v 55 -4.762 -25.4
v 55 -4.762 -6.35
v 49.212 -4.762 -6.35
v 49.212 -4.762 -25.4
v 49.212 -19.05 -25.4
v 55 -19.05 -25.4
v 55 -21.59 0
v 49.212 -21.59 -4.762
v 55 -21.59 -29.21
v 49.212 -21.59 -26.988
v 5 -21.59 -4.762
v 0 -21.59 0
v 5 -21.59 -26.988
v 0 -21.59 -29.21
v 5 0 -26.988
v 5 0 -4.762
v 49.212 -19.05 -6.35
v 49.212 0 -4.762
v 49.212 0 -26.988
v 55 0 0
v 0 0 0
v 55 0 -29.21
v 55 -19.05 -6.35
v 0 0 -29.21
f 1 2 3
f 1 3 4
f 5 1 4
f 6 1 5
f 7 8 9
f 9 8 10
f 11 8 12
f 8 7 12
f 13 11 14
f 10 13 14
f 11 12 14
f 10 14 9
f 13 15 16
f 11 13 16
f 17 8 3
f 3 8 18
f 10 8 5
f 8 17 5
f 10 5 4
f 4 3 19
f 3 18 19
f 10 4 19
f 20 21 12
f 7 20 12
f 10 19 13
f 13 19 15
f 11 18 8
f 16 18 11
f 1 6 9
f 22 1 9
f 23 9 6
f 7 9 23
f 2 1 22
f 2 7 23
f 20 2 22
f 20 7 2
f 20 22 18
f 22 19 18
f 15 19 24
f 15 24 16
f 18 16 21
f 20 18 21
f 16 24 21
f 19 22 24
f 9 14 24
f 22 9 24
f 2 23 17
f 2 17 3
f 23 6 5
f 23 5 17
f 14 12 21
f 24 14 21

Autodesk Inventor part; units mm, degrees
ref_plane "YZ Plane" through (0, 0, 0) normal (1, 0, 0) x (0, 1, 0)
ref_plane "XZ Plane" through (0, 0, 0) normal (0, 1, 0) x (-1, 0, 0)
ref_plane "XY Plane" through (0, 0, 0) normal (0, 0, 1) x (1, 0, 0)
sketch "Sketch1" plane through (0, 0, 0) normal (1, 0, 0) x (0, 1, 0)
  line L0 (0, 0) -> (-21.59, 0)
  line L1 (-21.59, 0) -> (-21.59, -29.21)
  line L2 (-21.59, -29.21) -> (0, -29.21)
  line L3 (0, -29.21) -> (0, 0)
  dimension "d25" = 29.21
  dimension "d26" = 21.59
extrude "Extrusion1" add sketch "Sketch1" along normal blind 55
sketch "Sketch3" plane through (0, 0, 0) normal (0, 1, 0) x (1, 0, 0)
  line L0 (55, 26.9875) -> (5, 26.9875) projected
  line L1 (55, 4.7625) -> (5, 4.7625) projected
  line L2 (49.2125, 26.9875) -> (5, 26.9875)
  line L3 (5, 26.9875) -> (5, 4.7625)
  line L4 (5, 4.7625) -> (49.2125, 4.7625)
  line L5 (49.2125, 4.7625) -> (49.2125, 26.9875)
  point P0 (0, 0)
extrude "Extrusion3" cut sketch "Sketch3" against normal blind 25
sketch "Sketch4" plane through (55, 0, 0) normal (1, 0, 0) x (0, 0, -1)
  line L0 (25.4, -19.05) -> (6.35, -19.05)
  line L1 (6.35, -19.05) -> (6.35, -4.7625)
  line L2 (6.35, -4.7625) -> (25.4, -4.7625)
  line L3 (25.4, -4.7625) -> (25.4, -19.05)
  point P0 (0, 0)
extrude "Extrusion4" cut sketch "Sketch4" against normal blind 25
